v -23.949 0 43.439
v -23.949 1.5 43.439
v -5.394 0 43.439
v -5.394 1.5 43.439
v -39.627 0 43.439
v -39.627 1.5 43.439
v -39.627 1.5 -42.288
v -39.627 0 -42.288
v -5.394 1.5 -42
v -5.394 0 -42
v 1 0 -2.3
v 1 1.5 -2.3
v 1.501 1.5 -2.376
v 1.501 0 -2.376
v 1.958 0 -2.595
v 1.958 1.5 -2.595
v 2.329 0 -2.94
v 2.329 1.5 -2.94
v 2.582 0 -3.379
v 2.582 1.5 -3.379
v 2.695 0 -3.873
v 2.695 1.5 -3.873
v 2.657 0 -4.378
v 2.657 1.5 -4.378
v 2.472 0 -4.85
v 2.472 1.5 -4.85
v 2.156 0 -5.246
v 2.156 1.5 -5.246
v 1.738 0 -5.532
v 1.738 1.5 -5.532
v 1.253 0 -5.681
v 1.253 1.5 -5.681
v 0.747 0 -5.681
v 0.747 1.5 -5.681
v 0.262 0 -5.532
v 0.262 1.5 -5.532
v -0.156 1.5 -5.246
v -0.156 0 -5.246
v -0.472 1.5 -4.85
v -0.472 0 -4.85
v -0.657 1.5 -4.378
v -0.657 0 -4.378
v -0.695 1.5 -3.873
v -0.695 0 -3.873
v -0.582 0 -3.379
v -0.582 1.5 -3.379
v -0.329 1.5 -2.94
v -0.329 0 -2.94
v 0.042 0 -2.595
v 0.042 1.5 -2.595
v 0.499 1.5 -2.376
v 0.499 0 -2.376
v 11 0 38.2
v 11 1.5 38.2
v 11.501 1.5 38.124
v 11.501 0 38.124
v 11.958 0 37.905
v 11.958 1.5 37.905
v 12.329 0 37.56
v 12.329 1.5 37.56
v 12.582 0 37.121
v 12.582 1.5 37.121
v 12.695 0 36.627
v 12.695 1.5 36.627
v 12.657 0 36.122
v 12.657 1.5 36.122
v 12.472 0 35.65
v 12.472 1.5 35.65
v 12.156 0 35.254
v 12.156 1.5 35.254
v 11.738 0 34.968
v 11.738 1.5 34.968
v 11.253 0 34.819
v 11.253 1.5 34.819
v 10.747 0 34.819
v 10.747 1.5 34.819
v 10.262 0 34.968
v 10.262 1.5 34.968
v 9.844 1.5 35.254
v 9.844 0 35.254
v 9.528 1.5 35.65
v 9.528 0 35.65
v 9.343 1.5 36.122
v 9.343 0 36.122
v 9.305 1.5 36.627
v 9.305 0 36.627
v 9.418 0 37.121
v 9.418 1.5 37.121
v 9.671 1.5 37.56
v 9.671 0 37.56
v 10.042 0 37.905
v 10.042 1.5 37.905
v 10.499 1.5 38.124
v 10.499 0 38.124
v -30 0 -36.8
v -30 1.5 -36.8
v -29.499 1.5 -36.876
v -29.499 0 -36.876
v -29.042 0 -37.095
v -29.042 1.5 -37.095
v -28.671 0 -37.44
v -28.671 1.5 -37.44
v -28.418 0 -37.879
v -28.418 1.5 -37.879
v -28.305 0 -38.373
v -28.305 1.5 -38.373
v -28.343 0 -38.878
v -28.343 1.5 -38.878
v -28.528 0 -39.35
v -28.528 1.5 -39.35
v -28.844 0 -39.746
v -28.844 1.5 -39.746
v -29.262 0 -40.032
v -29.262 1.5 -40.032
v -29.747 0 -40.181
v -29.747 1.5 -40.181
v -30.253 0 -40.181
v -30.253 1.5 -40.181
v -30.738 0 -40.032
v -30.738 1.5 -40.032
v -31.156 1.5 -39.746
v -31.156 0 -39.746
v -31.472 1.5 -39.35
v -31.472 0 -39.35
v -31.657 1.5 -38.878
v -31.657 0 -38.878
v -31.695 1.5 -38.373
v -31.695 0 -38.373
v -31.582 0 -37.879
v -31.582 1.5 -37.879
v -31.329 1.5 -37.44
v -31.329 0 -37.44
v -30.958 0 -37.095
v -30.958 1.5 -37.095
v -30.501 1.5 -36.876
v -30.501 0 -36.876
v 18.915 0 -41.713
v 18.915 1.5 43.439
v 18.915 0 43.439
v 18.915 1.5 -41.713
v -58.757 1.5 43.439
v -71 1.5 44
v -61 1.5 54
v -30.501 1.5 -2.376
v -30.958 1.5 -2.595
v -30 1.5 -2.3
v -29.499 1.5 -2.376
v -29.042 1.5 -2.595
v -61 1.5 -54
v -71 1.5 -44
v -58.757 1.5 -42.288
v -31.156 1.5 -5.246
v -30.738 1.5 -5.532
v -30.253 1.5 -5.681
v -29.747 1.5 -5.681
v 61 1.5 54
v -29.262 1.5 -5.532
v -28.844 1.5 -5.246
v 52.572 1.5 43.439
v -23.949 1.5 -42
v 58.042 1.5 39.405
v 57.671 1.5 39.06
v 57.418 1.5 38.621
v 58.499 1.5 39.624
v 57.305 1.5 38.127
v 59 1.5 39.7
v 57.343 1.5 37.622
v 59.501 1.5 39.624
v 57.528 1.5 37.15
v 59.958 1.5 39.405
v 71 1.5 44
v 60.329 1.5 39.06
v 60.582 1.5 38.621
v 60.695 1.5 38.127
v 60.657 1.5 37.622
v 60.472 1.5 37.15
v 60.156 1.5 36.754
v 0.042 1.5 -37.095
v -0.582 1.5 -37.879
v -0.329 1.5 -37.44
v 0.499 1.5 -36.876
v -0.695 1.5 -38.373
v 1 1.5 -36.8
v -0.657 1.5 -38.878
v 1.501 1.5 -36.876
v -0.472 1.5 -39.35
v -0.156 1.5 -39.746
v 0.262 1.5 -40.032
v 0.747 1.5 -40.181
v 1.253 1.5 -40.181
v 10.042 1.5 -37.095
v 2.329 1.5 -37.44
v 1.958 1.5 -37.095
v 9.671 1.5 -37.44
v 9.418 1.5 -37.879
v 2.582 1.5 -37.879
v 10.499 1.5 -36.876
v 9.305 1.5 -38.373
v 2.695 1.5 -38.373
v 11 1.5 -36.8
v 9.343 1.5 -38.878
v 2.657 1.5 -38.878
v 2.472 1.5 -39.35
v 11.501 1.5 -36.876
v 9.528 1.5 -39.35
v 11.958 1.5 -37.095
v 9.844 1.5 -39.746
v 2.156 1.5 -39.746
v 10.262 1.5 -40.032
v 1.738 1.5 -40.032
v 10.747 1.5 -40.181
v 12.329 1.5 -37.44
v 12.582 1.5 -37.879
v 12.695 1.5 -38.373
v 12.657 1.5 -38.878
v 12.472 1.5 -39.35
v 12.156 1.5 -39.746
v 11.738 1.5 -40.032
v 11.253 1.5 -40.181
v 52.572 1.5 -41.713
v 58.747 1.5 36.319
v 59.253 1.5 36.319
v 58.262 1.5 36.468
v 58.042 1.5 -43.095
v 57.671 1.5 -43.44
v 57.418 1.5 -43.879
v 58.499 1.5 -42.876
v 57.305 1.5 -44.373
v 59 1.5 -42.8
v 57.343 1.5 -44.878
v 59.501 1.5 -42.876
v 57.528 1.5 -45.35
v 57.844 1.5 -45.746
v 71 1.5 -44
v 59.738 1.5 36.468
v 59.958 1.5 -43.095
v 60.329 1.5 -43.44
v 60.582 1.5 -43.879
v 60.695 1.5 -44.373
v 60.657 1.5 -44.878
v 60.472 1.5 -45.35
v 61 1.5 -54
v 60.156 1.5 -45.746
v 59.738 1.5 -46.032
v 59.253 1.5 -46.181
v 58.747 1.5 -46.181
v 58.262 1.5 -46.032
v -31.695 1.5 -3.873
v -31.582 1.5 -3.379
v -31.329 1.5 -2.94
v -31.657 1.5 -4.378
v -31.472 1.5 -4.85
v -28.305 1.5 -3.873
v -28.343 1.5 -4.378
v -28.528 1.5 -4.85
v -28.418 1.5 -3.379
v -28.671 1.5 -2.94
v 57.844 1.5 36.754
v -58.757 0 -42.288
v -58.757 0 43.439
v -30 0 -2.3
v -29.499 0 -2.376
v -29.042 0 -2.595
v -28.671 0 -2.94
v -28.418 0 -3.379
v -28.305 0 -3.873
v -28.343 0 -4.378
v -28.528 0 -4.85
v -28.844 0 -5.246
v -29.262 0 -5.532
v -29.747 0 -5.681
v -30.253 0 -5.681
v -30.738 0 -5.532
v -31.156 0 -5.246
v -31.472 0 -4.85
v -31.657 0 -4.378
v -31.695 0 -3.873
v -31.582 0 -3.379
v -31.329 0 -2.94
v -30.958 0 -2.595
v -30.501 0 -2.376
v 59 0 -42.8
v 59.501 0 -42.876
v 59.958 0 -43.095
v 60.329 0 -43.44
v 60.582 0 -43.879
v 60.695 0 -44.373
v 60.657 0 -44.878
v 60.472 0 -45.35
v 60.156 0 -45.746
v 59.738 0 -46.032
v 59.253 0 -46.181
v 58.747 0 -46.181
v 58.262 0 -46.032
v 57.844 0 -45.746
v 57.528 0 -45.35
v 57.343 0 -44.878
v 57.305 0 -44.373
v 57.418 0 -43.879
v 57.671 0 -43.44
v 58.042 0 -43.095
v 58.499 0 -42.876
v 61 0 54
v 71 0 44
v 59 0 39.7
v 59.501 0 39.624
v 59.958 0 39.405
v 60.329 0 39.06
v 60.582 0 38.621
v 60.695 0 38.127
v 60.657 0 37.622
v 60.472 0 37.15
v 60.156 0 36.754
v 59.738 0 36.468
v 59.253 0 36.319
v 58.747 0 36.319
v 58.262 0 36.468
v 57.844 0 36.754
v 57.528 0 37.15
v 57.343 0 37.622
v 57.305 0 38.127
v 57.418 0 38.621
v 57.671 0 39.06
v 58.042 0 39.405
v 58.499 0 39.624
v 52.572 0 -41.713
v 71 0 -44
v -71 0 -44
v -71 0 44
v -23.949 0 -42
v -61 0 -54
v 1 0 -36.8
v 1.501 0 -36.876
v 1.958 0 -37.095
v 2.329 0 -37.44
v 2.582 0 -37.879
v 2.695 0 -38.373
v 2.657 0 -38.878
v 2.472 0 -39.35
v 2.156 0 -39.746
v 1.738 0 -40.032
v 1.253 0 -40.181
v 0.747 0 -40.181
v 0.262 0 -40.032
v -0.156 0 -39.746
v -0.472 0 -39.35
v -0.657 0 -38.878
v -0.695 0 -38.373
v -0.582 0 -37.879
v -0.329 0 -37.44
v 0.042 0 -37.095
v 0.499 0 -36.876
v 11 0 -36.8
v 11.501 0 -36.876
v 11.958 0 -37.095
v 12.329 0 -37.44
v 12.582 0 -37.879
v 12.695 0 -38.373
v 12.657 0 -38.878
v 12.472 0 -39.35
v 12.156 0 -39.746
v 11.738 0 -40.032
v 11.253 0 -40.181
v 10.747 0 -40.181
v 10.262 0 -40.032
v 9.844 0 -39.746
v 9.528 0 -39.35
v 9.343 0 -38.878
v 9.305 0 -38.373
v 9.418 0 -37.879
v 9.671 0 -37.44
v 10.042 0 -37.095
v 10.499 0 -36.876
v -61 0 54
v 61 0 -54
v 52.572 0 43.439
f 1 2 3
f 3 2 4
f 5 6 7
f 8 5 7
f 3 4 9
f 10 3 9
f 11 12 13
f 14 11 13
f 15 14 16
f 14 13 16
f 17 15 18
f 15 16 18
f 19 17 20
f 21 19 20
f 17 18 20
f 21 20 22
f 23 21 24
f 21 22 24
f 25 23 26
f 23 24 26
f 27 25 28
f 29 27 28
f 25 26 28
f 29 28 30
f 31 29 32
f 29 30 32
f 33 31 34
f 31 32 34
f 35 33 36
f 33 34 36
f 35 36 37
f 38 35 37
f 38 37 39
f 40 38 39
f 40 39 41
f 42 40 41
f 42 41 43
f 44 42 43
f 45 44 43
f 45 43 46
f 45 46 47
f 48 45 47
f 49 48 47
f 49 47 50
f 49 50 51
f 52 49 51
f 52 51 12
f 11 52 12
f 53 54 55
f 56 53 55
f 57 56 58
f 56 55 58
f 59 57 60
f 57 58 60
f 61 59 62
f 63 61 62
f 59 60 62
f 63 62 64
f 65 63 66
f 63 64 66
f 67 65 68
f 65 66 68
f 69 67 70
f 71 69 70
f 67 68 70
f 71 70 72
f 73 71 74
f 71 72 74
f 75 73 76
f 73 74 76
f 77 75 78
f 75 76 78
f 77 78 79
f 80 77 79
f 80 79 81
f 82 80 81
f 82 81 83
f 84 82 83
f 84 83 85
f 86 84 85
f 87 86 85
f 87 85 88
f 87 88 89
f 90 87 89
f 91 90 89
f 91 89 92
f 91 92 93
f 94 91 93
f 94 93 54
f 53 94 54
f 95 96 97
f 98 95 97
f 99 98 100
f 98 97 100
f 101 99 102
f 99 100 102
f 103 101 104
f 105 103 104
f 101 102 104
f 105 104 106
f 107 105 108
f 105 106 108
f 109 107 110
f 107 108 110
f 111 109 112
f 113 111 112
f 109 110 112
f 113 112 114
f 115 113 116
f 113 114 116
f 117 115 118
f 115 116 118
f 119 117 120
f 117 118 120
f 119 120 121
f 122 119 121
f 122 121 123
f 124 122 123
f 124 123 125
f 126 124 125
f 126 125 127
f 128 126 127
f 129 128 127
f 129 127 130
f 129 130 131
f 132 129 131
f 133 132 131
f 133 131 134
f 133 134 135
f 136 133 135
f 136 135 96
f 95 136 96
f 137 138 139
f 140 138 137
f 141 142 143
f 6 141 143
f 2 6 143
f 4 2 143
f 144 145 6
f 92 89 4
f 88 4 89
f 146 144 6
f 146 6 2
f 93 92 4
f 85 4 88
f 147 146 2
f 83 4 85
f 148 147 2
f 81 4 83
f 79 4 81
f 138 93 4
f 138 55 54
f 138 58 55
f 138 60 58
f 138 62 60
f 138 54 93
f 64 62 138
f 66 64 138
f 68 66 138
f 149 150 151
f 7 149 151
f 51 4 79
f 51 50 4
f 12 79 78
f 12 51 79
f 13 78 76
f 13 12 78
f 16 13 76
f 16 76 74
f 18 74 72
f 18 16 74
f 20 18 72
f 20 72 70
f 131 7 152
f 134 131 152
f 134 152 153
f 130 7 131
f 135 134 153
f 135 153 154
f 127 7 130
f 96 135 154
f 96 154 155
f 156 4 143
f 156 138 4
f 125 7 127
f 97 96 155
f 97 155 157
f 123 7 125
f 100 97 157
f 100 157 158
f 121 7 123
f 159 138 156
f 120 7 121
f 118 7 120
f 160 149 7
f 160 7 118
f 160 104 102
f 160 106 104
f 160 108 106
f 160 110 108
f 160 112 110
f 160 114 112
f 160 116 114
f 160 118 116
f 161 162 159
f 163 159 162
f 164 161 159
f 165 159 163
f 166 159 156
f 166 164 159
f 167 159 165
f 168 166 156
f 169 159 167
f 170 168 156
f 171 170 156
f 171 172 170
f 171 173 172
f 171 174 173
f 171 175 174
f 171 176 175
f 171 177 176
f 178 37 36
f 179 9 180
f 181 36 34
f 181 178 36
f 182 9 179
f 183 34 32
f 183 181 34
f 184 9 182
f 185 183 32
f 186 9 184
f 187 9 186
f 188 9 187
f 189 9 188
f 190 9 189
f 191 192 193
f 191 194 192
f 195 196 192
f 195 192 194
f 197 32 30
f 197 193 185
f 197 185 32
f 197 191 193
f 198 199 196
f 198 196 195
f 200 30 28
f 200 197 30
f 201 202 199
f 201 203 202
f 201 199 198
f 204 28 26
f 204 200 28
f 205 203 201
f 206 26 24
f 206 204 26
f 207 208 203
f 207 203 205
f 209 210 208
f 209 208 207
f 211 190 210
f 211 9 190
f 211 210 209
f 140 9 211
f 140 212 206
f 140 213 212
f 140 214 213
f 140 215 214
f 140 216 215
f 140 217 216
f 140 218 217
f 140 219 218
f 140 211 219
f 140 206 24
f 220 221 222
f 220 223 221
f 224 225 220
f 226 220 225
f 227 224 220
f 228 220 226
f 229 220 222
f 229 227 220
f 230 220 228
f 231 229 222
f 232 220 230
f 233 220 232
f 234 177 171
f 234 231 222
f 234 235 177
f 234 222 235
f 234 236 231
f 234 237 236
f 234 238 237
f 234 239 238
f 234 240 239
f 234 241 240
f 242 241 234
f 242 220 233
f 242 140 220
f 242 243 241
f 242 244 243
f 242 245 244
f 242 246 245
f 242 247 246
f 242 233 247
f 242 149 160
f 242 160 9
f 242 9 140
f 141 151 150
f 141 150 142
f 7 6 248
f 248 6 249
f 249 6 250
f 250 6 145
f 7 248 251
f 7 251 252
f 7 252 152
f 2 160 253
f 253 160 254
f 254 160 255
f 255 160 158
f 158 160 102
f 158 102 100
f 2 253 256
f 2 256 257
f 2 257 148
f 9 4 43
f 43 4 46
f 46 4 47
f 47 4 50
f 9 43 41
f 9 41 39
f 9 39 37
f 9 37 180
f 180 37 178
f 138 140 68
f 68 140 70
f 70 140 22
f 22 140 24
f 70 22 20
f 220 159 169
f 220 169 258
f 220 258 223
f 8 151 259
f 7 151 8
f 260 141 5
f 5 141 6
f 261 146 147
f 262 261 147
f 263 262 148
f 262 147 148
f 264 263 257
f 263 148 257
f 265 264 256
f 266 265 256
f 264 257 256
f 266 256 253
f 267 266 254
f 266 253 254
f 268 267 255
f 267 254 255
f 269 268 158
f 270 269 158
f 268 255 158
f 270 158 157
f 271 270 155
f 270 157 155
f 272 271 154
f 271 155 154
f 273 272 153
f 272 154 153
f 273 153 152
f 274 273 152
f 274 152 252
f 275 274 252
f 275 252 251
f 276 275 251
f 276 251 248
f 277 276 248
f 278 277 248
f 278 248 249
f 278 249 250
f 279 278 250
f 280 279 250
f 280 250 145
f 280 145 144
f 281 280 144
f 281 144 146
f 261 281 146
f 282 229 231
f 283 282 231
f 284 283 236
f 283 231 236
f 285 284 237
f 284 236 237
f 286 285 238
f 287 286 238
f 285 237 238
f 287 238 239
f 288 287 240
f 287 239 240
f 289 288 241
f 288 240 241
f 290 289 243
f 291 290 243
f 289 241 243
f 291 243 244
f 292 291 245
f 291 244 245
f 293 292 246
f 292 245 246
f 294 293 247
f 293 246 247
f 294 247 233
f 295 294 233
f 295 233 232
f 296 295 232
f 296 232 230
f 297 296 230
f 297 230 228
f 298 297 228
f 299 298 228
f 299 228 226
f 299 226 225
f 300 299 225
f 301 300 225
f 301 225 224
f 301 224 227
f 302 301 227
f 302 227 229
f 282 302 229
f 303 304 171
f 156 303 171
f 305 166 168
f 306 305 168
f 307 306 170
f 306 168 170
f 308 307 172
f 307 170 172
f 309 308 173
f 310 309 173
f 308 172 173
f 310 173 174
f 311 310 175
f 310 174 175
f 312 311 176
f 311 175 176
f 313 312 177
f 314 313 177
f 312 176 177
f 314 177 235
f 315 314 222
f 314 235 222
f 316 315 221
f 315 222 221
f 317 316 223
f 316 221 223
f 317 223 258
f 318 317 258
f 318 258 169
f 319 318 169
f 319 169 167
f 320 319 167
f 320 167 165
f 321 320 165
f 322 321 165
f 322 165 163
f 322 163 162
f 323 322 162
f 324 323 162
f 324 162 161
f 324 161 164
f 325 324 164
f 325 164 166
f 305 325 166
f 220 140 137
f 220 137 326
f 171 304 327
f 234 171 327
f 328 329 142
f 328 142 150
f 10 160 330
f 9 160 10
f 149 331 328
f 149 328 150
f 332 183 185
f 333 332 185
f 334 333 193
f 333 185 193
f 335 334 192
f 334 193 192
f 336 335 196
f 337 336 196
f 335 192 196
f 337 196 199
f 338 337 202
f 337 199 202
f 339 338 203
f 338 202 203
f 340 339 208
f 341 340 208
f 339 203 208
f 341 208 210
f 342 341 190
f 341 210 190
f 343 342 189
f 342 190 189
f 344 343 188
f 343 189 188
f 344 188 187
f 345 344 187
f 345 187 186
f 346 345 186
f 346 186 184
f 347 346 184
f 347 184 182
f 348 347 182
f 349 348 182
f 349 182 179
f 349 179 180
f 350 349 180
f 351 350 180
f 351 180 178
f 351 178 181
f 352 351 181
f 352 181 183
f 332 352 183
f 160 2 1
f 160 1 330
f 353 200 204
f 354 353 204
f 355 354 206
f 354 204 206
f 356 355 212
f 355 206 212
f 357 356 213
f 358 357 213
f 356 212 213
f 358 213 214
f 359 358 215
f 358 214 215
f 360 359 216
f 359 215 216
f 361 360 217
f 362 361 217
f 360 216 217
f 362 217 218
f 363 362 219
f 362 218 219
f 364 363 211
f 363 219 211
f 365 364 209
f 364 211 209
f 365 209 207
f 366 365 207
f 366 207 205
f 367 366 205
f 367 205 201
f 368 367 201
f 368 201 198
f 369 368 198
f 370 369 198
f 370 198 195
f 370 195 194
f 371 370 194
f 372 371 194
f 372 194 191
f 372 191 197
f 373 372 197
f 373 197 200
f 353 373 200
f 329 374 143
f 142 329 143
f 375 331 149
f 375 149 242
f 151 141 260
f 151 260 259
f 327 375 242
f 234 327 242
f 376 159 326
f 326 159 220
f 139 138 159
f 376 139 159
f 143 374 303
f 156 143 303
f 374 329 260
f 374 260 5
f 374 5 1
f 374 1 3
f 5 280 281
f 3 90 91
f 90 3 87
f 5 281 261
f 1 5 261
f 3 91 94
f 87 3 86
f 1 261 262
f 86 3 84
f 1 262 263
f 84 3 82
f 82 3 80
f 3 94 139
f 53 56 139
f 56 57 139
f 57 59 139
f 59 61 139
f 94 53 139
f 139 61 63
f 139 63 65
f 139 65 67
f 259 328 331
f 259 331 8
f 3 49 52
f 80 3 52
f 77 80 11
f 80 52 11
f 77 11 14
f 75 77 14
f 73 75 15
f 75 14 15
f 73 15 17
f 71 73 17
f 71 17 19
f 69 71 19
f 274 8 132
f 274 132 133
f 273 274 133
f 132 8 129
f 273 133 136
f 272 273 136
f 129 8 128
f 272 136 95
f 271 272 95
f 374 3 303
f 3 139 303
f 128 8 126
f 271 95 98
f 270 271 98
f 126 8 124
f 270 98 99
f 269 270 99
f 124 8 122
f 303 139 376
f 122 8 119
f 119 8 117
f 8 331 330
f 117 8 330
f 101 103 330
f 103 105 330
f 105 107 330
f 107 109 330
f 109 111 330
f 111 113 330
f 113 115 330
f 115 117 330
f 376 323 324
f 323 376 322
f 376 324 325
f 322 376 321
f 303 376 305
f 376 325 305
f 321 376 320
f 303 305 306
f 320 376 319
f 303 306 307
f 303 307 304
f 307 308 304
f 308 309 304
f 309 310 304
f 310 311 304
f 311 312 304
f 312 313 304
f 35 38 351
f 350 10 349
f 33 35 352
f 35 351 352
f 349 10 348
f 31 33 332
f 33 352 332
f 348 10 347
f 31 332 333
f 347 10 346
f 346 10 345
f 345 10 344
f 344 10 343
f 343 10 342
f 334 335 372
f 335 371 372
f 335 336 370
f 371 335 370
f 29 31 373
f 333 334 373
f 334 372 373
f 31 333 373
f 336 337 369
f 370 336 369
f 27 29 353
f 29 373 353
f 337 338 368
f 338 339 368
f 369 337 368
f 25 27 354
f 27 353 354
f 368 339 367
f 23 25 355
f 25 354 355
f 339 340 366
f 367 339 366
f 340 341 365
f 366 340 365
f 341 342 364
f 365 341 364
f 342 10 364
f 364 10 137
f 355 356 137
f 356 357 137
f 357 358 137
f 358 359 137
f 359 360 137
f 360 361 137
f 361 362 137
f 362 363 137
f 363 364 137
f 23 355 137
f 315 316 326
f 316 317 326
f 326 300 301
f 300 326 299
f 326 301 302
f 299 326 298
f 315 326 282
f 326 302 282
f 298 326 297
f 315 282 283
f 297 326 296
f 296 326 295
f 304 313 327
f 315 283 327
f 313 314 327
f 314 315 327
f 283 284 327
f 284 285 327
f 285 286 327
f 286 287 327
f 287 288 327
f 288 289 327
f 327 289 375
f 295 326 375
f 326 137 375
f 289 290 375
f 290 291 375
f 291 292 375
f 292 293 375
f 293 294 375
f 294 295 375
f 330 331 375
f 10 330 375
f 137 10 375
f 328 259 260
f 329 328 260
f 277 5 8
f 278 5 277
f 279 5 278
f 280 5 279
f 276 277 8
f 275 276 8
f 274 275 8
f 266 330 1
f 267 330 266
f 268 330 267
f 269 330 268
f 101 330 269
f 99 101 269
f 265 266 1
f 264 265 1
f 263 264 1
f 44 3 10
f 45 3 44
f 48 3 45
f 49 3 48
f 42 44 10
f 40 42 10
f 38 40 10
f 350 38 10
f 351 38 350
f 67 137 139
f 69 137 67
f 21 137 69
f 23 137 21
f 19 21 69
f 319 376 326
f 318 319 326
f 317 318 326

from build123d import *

# Parameters (mm, degrees)
SKETCH1_W           = 142
SKETCH1_H           = 108
BOSS_EXTRUDE1_DEPTH = 1.5
CHAMFER1_SIZE       = 10
CUT_EXTRUDE1_REACH  = 91.215
SKETCH2_R           = 1.7
CUT_EXTRUDE2_REACH  = 91.215
SKETCH3_R           = 1.7
CUT_EXTRUDE3_REACH  = 91.215
SKETCH4_W           = 19.130277945
SKETCH4_H           = 85.726659062
SKETCH4_W_2         = 33.657782249
SKETCH4_H_2         = 85.151312357
SKETCH4_W_3         = 18.55493124
SKETCH4_H_3         = 85.438985709


with BuildPart() as part:
    # Sketch1 → Boss-Extrude1 (new body)
    with BuildSketch(Plane(origin=(0, 0, 0), x_dir=(1, 0, 0), z_dir=(0, 1, 0))):
        Rectangle(SKETCH1_W, SKETCH1_H)
    extrude(amount=BOSS_EXTRUDE1_DEPTH)

    # Chamfer1
    chamfer1_edges = [part.edges().sort_by_distance(p)[0] for p in [
        (71, 0.75, 54),
        (-71, 0.75, 54),
        (-71, 0.75, -54),
        (71, 0.75, -54),
    ]]
    chamfer(chamfer1_edges, length=CHAMFER1_SIZE)

    # Sketch2 → Cut-Extrude1 (cut, up to next)
    with BuildSketch(Plane(origin=(0, 1.5, 0), x_dir=(1, 0, 0), z_dir=(0, 1, 0)), mode=Mode.PRIVATE) as cut_extrude1_sk1:
        with Locations(Location((59, 44.5, 0), (0, 0, 270))):
            Circle(SKETCH2_R)
    cut_extrude1_tool1 = extrude(cut_extrude1_sk1.sketch, amount=-CUT_EXTRUDE1_REACH, mode=Mode.PRIVATE) & part.part
    # Sketch2 → Cut-Extrude1 (cut, up to next)
    with BuildSketch(Plane(origin=(0, 1.5, 0), x_dir=(1, 0, 0), z_dir=(0, 1, 0)), mode=Mode.PRIVATE) as cut_extrude1_sk2:
        with Locations(Location((11, 38.5, 0), (0, 0, 270))):
            Circle(SKETCH2_R)
    cut_extrude1_tool2 = extrude(cut_extrude1_sk2.sketch, amount=-CUT_EXTRUDE1_REACH, mode=Mode.PRIVATE) & part.part
    # Sketch2 → Cut-Extrude1 (cut, up to next)
    with BuildSketch(Plane(origin=(0, 1.5, 0), x_dir=(1, 0, 0), z_dir=(0, 1, 0)), mode=Mode.PRIVATE) as cut_extrude1_sk3:
        with Locations(Location((11, -36.5, 0), (0, 0, 270))):
            Circle(SKETCH2_R)
    cut_extrude1_tool3 = extrude(cut_extrude1_sk3.sketch, amount=-CUT_EXTRUDE1_REACH, mode=Mode.PRIVATE) & part.part
    # Sketch2 → Cut-Extrude1 (cut, up to next)
    with BuildSketch(Plane(origin=(0, 1.5, 0), x_dir=(1, 0, 0), z_dir=(0, 1, 0)), mode=Mode.PRIVATE) as cut_extrude1_sk4:
        with Locations(Location((59, -38, 0), (0, 0, 270))):
            Circle(SKETCH2_R)
    cut_extrude1_tool4 = extrude(cut_extrude1_sk4.sketch, amount=-CUT_EXTRUDE1_REACH, mode=Mode.PRIVATE) & part.part
    add(cut_extrude1_tool1.solids().sort_by_distance((59, 1.5, -44.5))[0], mode=Mode.SUBTRACT)
    add(cut_extrude1_tool2.solids().sort_by_distance((11, 1.5, -38.5))[0], mode=Mode.SUBTRACT)
    add(cut_extrude1_tool3.solids().sort_by_distance((11, 1.5, 36.5))[0], mode=Mode.SUBTRACT)
    add(cut_extrude1_tool4.solids().sort_by_distance((59, 1.5, 38))[0], mode=Mode.SUBTRACT)

    # Sketch3 → Cut-Extrude2 (cut, up to next)
    with BuildSketch(Plane(origin=(0, 1.5, 0), x_dir=(1, 0, 0), z_dir=(0, 1, 0)), mode=Mode.PRIVATE) as cut_extrude2_sk1:
        with Locations(Location((-30, 38.5, 0), (0, 0, 270))):
            Circle(SKETCH3_R)
    cut_extrude2_tool1 = extrude(cut_extrude2_sk1.sketch, amount=-CUT_EXTRUDE2_REACH, mode=Mode.PRIVATE) & part.part
    # Sketch3 → Cut-Extrude2 (cut, up to next)
    with BuildSketch(Plane(origin=(0, 1.5, 0), x_dir=(1, 0, 0), z_dir=(0, 1, 0)), mode=Mode.PRIVATE) as cut_extrude2_sk2:
        with Locations(Location((1, 38.5, 0), (0, 0, 270))):
            Circle(SKETCH3_R)
    cut_extrude2_tool2 = extrude(cut_extrude2_sk2.sketch, amount=-CUT_EXTRUDE2_REACH, mode=Mode.PRIVATE) & part.part
    # Sketch3 → Cut-Extrude2 (cut, up to next)
    with BuildSketch(Plane(origin=(0, 1.5, 0), x_dir=(1, 0, 0), z_dir=(0, 1, 0)), mode=Mode.PRIVATE) as cut_extrude2_sk3:
        with Locations(Location((1, 4, 0), (0, 0, 270))):
            Circle(SKETCH3_R)
    cut_extrude2_tool3 = extrude(cut_extrude2_sk3.sketch, amount=-CUT_EXTRUDE2_REACH, mode=Mode.PRIVATE) & part.part
    # Sketch3 → Cut-Extrude2 (cut, up to next)
    with BuildSketch(Plane(origin=(0, 1.5, 0), x_dir=(1, 0, 0), z_dir=(0, 1, 0)), mode=Mode.PRIVATE) as cut_extrude2_sk4:
        with Locations(Location((-30, 4, 0), (0, 0, 270))):
            Circle(SKETCH3_R)
    cut_extrude2_tool4 = extrude(cut_extrude2_sk4.sketch, amount=-CUT_EXTRUDE2_REACH, mode=Mode.PRIVATE) & part.part
    add(cut_extrude2_tool1.solids().sort_by_distance((-30, 1.5, -38.5))[0], mode=Mode.SUBTRACT)
    add(cut_extrude2_tool2.solids().sort_by_distance((1, 1.5, -38.5))[0], mode=Mode.SUBTRACT)
    add(cut_extrude2_tool3.solids().sort_by_distance((1, 1.5, -4))[0], mode=Mode.SUBTRACT)
    add(cut_extrude2_tool4.solids().sort_by_distance((-30, 1.5, -4))[0], mode=Mode.SUBTRACT)

    # Sketch4 → Cut-Extrude3 (cut, up to next)
    with BuildSketch(Plane(origin=(0, 1.5, 0), x_dir=(1, 0, 0), z_dir=(0, 1, 0)), mode=Mode.PRIVATE) as cut_extrude3_sk1:
        with Locations((-49.192143288, -0.575346705)):
            Rectangle(SKETCH4_W, SKETCH4_H)
    cut_extrude3_tool1 = extrude(cut_extrude3_sk1.sketch, amount=-CUT_EXTRUDE3_REACH, mode=Mode.PRIVATE) & part.part
    # Sketch4 → Cut-Extrude3 (cut, up to next)
    with BuildSketch(Plane(origin=(0, 1.5, 0), x_dir=(1, 0, 0), z_dir=(0, 1, 0)), mode=Mode.PRIVATE) as cut_extrude3_sk2:
        with Locations((35.743414055, -0.863020057)):
            Rectangle(SKETCH4_W_2, SKETCH4_H_2)
    cut_extrude3_tool2 = extrude(cut_extrude3_sk2.sketch, amount=-CUT_EXTRUDE3_REACH, mode=Mode.PRIVATE) & part.part
    # Sketch4 → Cut-Extrude3 (cut, up to next)
    with BuildSketch(Plane(origin=(0, 1.5, 0), x_dir=(1, 0, 0), z_dir=(0, 1, 0)), mode=Mode.PRIVATE) as cut_extrude3_sk3:
        with Locations((-14.67134098, -0.719183381)):
            Rectangle(SKETCH4_W_3, SKETCH4_H_3)
    cut_extrude3_tool3 = extrude(cut_extrude3_sk3.sketch, amount=-CUT_EXTRUDE3_REACH, mode=Mode.PRIVATE) & part.part
    add(cut_extrude3_tool1.solids().sort_by_distance((-49.192143, 1.5, 0.575347))[0], mode=Mode.SUBTRACT)
    add(cut_extrude3_tool2.solids().sort_by_distance((35.743414, 1.5, 0.86302))[0], mode=Mode.SUBTRACT)
    add(cut_extrude3_tool3.solids().sort_by_distance((-14.671341, 1.5, 0.719183))[0], mode=Mode.SUBTRACT)


solid = part.part
